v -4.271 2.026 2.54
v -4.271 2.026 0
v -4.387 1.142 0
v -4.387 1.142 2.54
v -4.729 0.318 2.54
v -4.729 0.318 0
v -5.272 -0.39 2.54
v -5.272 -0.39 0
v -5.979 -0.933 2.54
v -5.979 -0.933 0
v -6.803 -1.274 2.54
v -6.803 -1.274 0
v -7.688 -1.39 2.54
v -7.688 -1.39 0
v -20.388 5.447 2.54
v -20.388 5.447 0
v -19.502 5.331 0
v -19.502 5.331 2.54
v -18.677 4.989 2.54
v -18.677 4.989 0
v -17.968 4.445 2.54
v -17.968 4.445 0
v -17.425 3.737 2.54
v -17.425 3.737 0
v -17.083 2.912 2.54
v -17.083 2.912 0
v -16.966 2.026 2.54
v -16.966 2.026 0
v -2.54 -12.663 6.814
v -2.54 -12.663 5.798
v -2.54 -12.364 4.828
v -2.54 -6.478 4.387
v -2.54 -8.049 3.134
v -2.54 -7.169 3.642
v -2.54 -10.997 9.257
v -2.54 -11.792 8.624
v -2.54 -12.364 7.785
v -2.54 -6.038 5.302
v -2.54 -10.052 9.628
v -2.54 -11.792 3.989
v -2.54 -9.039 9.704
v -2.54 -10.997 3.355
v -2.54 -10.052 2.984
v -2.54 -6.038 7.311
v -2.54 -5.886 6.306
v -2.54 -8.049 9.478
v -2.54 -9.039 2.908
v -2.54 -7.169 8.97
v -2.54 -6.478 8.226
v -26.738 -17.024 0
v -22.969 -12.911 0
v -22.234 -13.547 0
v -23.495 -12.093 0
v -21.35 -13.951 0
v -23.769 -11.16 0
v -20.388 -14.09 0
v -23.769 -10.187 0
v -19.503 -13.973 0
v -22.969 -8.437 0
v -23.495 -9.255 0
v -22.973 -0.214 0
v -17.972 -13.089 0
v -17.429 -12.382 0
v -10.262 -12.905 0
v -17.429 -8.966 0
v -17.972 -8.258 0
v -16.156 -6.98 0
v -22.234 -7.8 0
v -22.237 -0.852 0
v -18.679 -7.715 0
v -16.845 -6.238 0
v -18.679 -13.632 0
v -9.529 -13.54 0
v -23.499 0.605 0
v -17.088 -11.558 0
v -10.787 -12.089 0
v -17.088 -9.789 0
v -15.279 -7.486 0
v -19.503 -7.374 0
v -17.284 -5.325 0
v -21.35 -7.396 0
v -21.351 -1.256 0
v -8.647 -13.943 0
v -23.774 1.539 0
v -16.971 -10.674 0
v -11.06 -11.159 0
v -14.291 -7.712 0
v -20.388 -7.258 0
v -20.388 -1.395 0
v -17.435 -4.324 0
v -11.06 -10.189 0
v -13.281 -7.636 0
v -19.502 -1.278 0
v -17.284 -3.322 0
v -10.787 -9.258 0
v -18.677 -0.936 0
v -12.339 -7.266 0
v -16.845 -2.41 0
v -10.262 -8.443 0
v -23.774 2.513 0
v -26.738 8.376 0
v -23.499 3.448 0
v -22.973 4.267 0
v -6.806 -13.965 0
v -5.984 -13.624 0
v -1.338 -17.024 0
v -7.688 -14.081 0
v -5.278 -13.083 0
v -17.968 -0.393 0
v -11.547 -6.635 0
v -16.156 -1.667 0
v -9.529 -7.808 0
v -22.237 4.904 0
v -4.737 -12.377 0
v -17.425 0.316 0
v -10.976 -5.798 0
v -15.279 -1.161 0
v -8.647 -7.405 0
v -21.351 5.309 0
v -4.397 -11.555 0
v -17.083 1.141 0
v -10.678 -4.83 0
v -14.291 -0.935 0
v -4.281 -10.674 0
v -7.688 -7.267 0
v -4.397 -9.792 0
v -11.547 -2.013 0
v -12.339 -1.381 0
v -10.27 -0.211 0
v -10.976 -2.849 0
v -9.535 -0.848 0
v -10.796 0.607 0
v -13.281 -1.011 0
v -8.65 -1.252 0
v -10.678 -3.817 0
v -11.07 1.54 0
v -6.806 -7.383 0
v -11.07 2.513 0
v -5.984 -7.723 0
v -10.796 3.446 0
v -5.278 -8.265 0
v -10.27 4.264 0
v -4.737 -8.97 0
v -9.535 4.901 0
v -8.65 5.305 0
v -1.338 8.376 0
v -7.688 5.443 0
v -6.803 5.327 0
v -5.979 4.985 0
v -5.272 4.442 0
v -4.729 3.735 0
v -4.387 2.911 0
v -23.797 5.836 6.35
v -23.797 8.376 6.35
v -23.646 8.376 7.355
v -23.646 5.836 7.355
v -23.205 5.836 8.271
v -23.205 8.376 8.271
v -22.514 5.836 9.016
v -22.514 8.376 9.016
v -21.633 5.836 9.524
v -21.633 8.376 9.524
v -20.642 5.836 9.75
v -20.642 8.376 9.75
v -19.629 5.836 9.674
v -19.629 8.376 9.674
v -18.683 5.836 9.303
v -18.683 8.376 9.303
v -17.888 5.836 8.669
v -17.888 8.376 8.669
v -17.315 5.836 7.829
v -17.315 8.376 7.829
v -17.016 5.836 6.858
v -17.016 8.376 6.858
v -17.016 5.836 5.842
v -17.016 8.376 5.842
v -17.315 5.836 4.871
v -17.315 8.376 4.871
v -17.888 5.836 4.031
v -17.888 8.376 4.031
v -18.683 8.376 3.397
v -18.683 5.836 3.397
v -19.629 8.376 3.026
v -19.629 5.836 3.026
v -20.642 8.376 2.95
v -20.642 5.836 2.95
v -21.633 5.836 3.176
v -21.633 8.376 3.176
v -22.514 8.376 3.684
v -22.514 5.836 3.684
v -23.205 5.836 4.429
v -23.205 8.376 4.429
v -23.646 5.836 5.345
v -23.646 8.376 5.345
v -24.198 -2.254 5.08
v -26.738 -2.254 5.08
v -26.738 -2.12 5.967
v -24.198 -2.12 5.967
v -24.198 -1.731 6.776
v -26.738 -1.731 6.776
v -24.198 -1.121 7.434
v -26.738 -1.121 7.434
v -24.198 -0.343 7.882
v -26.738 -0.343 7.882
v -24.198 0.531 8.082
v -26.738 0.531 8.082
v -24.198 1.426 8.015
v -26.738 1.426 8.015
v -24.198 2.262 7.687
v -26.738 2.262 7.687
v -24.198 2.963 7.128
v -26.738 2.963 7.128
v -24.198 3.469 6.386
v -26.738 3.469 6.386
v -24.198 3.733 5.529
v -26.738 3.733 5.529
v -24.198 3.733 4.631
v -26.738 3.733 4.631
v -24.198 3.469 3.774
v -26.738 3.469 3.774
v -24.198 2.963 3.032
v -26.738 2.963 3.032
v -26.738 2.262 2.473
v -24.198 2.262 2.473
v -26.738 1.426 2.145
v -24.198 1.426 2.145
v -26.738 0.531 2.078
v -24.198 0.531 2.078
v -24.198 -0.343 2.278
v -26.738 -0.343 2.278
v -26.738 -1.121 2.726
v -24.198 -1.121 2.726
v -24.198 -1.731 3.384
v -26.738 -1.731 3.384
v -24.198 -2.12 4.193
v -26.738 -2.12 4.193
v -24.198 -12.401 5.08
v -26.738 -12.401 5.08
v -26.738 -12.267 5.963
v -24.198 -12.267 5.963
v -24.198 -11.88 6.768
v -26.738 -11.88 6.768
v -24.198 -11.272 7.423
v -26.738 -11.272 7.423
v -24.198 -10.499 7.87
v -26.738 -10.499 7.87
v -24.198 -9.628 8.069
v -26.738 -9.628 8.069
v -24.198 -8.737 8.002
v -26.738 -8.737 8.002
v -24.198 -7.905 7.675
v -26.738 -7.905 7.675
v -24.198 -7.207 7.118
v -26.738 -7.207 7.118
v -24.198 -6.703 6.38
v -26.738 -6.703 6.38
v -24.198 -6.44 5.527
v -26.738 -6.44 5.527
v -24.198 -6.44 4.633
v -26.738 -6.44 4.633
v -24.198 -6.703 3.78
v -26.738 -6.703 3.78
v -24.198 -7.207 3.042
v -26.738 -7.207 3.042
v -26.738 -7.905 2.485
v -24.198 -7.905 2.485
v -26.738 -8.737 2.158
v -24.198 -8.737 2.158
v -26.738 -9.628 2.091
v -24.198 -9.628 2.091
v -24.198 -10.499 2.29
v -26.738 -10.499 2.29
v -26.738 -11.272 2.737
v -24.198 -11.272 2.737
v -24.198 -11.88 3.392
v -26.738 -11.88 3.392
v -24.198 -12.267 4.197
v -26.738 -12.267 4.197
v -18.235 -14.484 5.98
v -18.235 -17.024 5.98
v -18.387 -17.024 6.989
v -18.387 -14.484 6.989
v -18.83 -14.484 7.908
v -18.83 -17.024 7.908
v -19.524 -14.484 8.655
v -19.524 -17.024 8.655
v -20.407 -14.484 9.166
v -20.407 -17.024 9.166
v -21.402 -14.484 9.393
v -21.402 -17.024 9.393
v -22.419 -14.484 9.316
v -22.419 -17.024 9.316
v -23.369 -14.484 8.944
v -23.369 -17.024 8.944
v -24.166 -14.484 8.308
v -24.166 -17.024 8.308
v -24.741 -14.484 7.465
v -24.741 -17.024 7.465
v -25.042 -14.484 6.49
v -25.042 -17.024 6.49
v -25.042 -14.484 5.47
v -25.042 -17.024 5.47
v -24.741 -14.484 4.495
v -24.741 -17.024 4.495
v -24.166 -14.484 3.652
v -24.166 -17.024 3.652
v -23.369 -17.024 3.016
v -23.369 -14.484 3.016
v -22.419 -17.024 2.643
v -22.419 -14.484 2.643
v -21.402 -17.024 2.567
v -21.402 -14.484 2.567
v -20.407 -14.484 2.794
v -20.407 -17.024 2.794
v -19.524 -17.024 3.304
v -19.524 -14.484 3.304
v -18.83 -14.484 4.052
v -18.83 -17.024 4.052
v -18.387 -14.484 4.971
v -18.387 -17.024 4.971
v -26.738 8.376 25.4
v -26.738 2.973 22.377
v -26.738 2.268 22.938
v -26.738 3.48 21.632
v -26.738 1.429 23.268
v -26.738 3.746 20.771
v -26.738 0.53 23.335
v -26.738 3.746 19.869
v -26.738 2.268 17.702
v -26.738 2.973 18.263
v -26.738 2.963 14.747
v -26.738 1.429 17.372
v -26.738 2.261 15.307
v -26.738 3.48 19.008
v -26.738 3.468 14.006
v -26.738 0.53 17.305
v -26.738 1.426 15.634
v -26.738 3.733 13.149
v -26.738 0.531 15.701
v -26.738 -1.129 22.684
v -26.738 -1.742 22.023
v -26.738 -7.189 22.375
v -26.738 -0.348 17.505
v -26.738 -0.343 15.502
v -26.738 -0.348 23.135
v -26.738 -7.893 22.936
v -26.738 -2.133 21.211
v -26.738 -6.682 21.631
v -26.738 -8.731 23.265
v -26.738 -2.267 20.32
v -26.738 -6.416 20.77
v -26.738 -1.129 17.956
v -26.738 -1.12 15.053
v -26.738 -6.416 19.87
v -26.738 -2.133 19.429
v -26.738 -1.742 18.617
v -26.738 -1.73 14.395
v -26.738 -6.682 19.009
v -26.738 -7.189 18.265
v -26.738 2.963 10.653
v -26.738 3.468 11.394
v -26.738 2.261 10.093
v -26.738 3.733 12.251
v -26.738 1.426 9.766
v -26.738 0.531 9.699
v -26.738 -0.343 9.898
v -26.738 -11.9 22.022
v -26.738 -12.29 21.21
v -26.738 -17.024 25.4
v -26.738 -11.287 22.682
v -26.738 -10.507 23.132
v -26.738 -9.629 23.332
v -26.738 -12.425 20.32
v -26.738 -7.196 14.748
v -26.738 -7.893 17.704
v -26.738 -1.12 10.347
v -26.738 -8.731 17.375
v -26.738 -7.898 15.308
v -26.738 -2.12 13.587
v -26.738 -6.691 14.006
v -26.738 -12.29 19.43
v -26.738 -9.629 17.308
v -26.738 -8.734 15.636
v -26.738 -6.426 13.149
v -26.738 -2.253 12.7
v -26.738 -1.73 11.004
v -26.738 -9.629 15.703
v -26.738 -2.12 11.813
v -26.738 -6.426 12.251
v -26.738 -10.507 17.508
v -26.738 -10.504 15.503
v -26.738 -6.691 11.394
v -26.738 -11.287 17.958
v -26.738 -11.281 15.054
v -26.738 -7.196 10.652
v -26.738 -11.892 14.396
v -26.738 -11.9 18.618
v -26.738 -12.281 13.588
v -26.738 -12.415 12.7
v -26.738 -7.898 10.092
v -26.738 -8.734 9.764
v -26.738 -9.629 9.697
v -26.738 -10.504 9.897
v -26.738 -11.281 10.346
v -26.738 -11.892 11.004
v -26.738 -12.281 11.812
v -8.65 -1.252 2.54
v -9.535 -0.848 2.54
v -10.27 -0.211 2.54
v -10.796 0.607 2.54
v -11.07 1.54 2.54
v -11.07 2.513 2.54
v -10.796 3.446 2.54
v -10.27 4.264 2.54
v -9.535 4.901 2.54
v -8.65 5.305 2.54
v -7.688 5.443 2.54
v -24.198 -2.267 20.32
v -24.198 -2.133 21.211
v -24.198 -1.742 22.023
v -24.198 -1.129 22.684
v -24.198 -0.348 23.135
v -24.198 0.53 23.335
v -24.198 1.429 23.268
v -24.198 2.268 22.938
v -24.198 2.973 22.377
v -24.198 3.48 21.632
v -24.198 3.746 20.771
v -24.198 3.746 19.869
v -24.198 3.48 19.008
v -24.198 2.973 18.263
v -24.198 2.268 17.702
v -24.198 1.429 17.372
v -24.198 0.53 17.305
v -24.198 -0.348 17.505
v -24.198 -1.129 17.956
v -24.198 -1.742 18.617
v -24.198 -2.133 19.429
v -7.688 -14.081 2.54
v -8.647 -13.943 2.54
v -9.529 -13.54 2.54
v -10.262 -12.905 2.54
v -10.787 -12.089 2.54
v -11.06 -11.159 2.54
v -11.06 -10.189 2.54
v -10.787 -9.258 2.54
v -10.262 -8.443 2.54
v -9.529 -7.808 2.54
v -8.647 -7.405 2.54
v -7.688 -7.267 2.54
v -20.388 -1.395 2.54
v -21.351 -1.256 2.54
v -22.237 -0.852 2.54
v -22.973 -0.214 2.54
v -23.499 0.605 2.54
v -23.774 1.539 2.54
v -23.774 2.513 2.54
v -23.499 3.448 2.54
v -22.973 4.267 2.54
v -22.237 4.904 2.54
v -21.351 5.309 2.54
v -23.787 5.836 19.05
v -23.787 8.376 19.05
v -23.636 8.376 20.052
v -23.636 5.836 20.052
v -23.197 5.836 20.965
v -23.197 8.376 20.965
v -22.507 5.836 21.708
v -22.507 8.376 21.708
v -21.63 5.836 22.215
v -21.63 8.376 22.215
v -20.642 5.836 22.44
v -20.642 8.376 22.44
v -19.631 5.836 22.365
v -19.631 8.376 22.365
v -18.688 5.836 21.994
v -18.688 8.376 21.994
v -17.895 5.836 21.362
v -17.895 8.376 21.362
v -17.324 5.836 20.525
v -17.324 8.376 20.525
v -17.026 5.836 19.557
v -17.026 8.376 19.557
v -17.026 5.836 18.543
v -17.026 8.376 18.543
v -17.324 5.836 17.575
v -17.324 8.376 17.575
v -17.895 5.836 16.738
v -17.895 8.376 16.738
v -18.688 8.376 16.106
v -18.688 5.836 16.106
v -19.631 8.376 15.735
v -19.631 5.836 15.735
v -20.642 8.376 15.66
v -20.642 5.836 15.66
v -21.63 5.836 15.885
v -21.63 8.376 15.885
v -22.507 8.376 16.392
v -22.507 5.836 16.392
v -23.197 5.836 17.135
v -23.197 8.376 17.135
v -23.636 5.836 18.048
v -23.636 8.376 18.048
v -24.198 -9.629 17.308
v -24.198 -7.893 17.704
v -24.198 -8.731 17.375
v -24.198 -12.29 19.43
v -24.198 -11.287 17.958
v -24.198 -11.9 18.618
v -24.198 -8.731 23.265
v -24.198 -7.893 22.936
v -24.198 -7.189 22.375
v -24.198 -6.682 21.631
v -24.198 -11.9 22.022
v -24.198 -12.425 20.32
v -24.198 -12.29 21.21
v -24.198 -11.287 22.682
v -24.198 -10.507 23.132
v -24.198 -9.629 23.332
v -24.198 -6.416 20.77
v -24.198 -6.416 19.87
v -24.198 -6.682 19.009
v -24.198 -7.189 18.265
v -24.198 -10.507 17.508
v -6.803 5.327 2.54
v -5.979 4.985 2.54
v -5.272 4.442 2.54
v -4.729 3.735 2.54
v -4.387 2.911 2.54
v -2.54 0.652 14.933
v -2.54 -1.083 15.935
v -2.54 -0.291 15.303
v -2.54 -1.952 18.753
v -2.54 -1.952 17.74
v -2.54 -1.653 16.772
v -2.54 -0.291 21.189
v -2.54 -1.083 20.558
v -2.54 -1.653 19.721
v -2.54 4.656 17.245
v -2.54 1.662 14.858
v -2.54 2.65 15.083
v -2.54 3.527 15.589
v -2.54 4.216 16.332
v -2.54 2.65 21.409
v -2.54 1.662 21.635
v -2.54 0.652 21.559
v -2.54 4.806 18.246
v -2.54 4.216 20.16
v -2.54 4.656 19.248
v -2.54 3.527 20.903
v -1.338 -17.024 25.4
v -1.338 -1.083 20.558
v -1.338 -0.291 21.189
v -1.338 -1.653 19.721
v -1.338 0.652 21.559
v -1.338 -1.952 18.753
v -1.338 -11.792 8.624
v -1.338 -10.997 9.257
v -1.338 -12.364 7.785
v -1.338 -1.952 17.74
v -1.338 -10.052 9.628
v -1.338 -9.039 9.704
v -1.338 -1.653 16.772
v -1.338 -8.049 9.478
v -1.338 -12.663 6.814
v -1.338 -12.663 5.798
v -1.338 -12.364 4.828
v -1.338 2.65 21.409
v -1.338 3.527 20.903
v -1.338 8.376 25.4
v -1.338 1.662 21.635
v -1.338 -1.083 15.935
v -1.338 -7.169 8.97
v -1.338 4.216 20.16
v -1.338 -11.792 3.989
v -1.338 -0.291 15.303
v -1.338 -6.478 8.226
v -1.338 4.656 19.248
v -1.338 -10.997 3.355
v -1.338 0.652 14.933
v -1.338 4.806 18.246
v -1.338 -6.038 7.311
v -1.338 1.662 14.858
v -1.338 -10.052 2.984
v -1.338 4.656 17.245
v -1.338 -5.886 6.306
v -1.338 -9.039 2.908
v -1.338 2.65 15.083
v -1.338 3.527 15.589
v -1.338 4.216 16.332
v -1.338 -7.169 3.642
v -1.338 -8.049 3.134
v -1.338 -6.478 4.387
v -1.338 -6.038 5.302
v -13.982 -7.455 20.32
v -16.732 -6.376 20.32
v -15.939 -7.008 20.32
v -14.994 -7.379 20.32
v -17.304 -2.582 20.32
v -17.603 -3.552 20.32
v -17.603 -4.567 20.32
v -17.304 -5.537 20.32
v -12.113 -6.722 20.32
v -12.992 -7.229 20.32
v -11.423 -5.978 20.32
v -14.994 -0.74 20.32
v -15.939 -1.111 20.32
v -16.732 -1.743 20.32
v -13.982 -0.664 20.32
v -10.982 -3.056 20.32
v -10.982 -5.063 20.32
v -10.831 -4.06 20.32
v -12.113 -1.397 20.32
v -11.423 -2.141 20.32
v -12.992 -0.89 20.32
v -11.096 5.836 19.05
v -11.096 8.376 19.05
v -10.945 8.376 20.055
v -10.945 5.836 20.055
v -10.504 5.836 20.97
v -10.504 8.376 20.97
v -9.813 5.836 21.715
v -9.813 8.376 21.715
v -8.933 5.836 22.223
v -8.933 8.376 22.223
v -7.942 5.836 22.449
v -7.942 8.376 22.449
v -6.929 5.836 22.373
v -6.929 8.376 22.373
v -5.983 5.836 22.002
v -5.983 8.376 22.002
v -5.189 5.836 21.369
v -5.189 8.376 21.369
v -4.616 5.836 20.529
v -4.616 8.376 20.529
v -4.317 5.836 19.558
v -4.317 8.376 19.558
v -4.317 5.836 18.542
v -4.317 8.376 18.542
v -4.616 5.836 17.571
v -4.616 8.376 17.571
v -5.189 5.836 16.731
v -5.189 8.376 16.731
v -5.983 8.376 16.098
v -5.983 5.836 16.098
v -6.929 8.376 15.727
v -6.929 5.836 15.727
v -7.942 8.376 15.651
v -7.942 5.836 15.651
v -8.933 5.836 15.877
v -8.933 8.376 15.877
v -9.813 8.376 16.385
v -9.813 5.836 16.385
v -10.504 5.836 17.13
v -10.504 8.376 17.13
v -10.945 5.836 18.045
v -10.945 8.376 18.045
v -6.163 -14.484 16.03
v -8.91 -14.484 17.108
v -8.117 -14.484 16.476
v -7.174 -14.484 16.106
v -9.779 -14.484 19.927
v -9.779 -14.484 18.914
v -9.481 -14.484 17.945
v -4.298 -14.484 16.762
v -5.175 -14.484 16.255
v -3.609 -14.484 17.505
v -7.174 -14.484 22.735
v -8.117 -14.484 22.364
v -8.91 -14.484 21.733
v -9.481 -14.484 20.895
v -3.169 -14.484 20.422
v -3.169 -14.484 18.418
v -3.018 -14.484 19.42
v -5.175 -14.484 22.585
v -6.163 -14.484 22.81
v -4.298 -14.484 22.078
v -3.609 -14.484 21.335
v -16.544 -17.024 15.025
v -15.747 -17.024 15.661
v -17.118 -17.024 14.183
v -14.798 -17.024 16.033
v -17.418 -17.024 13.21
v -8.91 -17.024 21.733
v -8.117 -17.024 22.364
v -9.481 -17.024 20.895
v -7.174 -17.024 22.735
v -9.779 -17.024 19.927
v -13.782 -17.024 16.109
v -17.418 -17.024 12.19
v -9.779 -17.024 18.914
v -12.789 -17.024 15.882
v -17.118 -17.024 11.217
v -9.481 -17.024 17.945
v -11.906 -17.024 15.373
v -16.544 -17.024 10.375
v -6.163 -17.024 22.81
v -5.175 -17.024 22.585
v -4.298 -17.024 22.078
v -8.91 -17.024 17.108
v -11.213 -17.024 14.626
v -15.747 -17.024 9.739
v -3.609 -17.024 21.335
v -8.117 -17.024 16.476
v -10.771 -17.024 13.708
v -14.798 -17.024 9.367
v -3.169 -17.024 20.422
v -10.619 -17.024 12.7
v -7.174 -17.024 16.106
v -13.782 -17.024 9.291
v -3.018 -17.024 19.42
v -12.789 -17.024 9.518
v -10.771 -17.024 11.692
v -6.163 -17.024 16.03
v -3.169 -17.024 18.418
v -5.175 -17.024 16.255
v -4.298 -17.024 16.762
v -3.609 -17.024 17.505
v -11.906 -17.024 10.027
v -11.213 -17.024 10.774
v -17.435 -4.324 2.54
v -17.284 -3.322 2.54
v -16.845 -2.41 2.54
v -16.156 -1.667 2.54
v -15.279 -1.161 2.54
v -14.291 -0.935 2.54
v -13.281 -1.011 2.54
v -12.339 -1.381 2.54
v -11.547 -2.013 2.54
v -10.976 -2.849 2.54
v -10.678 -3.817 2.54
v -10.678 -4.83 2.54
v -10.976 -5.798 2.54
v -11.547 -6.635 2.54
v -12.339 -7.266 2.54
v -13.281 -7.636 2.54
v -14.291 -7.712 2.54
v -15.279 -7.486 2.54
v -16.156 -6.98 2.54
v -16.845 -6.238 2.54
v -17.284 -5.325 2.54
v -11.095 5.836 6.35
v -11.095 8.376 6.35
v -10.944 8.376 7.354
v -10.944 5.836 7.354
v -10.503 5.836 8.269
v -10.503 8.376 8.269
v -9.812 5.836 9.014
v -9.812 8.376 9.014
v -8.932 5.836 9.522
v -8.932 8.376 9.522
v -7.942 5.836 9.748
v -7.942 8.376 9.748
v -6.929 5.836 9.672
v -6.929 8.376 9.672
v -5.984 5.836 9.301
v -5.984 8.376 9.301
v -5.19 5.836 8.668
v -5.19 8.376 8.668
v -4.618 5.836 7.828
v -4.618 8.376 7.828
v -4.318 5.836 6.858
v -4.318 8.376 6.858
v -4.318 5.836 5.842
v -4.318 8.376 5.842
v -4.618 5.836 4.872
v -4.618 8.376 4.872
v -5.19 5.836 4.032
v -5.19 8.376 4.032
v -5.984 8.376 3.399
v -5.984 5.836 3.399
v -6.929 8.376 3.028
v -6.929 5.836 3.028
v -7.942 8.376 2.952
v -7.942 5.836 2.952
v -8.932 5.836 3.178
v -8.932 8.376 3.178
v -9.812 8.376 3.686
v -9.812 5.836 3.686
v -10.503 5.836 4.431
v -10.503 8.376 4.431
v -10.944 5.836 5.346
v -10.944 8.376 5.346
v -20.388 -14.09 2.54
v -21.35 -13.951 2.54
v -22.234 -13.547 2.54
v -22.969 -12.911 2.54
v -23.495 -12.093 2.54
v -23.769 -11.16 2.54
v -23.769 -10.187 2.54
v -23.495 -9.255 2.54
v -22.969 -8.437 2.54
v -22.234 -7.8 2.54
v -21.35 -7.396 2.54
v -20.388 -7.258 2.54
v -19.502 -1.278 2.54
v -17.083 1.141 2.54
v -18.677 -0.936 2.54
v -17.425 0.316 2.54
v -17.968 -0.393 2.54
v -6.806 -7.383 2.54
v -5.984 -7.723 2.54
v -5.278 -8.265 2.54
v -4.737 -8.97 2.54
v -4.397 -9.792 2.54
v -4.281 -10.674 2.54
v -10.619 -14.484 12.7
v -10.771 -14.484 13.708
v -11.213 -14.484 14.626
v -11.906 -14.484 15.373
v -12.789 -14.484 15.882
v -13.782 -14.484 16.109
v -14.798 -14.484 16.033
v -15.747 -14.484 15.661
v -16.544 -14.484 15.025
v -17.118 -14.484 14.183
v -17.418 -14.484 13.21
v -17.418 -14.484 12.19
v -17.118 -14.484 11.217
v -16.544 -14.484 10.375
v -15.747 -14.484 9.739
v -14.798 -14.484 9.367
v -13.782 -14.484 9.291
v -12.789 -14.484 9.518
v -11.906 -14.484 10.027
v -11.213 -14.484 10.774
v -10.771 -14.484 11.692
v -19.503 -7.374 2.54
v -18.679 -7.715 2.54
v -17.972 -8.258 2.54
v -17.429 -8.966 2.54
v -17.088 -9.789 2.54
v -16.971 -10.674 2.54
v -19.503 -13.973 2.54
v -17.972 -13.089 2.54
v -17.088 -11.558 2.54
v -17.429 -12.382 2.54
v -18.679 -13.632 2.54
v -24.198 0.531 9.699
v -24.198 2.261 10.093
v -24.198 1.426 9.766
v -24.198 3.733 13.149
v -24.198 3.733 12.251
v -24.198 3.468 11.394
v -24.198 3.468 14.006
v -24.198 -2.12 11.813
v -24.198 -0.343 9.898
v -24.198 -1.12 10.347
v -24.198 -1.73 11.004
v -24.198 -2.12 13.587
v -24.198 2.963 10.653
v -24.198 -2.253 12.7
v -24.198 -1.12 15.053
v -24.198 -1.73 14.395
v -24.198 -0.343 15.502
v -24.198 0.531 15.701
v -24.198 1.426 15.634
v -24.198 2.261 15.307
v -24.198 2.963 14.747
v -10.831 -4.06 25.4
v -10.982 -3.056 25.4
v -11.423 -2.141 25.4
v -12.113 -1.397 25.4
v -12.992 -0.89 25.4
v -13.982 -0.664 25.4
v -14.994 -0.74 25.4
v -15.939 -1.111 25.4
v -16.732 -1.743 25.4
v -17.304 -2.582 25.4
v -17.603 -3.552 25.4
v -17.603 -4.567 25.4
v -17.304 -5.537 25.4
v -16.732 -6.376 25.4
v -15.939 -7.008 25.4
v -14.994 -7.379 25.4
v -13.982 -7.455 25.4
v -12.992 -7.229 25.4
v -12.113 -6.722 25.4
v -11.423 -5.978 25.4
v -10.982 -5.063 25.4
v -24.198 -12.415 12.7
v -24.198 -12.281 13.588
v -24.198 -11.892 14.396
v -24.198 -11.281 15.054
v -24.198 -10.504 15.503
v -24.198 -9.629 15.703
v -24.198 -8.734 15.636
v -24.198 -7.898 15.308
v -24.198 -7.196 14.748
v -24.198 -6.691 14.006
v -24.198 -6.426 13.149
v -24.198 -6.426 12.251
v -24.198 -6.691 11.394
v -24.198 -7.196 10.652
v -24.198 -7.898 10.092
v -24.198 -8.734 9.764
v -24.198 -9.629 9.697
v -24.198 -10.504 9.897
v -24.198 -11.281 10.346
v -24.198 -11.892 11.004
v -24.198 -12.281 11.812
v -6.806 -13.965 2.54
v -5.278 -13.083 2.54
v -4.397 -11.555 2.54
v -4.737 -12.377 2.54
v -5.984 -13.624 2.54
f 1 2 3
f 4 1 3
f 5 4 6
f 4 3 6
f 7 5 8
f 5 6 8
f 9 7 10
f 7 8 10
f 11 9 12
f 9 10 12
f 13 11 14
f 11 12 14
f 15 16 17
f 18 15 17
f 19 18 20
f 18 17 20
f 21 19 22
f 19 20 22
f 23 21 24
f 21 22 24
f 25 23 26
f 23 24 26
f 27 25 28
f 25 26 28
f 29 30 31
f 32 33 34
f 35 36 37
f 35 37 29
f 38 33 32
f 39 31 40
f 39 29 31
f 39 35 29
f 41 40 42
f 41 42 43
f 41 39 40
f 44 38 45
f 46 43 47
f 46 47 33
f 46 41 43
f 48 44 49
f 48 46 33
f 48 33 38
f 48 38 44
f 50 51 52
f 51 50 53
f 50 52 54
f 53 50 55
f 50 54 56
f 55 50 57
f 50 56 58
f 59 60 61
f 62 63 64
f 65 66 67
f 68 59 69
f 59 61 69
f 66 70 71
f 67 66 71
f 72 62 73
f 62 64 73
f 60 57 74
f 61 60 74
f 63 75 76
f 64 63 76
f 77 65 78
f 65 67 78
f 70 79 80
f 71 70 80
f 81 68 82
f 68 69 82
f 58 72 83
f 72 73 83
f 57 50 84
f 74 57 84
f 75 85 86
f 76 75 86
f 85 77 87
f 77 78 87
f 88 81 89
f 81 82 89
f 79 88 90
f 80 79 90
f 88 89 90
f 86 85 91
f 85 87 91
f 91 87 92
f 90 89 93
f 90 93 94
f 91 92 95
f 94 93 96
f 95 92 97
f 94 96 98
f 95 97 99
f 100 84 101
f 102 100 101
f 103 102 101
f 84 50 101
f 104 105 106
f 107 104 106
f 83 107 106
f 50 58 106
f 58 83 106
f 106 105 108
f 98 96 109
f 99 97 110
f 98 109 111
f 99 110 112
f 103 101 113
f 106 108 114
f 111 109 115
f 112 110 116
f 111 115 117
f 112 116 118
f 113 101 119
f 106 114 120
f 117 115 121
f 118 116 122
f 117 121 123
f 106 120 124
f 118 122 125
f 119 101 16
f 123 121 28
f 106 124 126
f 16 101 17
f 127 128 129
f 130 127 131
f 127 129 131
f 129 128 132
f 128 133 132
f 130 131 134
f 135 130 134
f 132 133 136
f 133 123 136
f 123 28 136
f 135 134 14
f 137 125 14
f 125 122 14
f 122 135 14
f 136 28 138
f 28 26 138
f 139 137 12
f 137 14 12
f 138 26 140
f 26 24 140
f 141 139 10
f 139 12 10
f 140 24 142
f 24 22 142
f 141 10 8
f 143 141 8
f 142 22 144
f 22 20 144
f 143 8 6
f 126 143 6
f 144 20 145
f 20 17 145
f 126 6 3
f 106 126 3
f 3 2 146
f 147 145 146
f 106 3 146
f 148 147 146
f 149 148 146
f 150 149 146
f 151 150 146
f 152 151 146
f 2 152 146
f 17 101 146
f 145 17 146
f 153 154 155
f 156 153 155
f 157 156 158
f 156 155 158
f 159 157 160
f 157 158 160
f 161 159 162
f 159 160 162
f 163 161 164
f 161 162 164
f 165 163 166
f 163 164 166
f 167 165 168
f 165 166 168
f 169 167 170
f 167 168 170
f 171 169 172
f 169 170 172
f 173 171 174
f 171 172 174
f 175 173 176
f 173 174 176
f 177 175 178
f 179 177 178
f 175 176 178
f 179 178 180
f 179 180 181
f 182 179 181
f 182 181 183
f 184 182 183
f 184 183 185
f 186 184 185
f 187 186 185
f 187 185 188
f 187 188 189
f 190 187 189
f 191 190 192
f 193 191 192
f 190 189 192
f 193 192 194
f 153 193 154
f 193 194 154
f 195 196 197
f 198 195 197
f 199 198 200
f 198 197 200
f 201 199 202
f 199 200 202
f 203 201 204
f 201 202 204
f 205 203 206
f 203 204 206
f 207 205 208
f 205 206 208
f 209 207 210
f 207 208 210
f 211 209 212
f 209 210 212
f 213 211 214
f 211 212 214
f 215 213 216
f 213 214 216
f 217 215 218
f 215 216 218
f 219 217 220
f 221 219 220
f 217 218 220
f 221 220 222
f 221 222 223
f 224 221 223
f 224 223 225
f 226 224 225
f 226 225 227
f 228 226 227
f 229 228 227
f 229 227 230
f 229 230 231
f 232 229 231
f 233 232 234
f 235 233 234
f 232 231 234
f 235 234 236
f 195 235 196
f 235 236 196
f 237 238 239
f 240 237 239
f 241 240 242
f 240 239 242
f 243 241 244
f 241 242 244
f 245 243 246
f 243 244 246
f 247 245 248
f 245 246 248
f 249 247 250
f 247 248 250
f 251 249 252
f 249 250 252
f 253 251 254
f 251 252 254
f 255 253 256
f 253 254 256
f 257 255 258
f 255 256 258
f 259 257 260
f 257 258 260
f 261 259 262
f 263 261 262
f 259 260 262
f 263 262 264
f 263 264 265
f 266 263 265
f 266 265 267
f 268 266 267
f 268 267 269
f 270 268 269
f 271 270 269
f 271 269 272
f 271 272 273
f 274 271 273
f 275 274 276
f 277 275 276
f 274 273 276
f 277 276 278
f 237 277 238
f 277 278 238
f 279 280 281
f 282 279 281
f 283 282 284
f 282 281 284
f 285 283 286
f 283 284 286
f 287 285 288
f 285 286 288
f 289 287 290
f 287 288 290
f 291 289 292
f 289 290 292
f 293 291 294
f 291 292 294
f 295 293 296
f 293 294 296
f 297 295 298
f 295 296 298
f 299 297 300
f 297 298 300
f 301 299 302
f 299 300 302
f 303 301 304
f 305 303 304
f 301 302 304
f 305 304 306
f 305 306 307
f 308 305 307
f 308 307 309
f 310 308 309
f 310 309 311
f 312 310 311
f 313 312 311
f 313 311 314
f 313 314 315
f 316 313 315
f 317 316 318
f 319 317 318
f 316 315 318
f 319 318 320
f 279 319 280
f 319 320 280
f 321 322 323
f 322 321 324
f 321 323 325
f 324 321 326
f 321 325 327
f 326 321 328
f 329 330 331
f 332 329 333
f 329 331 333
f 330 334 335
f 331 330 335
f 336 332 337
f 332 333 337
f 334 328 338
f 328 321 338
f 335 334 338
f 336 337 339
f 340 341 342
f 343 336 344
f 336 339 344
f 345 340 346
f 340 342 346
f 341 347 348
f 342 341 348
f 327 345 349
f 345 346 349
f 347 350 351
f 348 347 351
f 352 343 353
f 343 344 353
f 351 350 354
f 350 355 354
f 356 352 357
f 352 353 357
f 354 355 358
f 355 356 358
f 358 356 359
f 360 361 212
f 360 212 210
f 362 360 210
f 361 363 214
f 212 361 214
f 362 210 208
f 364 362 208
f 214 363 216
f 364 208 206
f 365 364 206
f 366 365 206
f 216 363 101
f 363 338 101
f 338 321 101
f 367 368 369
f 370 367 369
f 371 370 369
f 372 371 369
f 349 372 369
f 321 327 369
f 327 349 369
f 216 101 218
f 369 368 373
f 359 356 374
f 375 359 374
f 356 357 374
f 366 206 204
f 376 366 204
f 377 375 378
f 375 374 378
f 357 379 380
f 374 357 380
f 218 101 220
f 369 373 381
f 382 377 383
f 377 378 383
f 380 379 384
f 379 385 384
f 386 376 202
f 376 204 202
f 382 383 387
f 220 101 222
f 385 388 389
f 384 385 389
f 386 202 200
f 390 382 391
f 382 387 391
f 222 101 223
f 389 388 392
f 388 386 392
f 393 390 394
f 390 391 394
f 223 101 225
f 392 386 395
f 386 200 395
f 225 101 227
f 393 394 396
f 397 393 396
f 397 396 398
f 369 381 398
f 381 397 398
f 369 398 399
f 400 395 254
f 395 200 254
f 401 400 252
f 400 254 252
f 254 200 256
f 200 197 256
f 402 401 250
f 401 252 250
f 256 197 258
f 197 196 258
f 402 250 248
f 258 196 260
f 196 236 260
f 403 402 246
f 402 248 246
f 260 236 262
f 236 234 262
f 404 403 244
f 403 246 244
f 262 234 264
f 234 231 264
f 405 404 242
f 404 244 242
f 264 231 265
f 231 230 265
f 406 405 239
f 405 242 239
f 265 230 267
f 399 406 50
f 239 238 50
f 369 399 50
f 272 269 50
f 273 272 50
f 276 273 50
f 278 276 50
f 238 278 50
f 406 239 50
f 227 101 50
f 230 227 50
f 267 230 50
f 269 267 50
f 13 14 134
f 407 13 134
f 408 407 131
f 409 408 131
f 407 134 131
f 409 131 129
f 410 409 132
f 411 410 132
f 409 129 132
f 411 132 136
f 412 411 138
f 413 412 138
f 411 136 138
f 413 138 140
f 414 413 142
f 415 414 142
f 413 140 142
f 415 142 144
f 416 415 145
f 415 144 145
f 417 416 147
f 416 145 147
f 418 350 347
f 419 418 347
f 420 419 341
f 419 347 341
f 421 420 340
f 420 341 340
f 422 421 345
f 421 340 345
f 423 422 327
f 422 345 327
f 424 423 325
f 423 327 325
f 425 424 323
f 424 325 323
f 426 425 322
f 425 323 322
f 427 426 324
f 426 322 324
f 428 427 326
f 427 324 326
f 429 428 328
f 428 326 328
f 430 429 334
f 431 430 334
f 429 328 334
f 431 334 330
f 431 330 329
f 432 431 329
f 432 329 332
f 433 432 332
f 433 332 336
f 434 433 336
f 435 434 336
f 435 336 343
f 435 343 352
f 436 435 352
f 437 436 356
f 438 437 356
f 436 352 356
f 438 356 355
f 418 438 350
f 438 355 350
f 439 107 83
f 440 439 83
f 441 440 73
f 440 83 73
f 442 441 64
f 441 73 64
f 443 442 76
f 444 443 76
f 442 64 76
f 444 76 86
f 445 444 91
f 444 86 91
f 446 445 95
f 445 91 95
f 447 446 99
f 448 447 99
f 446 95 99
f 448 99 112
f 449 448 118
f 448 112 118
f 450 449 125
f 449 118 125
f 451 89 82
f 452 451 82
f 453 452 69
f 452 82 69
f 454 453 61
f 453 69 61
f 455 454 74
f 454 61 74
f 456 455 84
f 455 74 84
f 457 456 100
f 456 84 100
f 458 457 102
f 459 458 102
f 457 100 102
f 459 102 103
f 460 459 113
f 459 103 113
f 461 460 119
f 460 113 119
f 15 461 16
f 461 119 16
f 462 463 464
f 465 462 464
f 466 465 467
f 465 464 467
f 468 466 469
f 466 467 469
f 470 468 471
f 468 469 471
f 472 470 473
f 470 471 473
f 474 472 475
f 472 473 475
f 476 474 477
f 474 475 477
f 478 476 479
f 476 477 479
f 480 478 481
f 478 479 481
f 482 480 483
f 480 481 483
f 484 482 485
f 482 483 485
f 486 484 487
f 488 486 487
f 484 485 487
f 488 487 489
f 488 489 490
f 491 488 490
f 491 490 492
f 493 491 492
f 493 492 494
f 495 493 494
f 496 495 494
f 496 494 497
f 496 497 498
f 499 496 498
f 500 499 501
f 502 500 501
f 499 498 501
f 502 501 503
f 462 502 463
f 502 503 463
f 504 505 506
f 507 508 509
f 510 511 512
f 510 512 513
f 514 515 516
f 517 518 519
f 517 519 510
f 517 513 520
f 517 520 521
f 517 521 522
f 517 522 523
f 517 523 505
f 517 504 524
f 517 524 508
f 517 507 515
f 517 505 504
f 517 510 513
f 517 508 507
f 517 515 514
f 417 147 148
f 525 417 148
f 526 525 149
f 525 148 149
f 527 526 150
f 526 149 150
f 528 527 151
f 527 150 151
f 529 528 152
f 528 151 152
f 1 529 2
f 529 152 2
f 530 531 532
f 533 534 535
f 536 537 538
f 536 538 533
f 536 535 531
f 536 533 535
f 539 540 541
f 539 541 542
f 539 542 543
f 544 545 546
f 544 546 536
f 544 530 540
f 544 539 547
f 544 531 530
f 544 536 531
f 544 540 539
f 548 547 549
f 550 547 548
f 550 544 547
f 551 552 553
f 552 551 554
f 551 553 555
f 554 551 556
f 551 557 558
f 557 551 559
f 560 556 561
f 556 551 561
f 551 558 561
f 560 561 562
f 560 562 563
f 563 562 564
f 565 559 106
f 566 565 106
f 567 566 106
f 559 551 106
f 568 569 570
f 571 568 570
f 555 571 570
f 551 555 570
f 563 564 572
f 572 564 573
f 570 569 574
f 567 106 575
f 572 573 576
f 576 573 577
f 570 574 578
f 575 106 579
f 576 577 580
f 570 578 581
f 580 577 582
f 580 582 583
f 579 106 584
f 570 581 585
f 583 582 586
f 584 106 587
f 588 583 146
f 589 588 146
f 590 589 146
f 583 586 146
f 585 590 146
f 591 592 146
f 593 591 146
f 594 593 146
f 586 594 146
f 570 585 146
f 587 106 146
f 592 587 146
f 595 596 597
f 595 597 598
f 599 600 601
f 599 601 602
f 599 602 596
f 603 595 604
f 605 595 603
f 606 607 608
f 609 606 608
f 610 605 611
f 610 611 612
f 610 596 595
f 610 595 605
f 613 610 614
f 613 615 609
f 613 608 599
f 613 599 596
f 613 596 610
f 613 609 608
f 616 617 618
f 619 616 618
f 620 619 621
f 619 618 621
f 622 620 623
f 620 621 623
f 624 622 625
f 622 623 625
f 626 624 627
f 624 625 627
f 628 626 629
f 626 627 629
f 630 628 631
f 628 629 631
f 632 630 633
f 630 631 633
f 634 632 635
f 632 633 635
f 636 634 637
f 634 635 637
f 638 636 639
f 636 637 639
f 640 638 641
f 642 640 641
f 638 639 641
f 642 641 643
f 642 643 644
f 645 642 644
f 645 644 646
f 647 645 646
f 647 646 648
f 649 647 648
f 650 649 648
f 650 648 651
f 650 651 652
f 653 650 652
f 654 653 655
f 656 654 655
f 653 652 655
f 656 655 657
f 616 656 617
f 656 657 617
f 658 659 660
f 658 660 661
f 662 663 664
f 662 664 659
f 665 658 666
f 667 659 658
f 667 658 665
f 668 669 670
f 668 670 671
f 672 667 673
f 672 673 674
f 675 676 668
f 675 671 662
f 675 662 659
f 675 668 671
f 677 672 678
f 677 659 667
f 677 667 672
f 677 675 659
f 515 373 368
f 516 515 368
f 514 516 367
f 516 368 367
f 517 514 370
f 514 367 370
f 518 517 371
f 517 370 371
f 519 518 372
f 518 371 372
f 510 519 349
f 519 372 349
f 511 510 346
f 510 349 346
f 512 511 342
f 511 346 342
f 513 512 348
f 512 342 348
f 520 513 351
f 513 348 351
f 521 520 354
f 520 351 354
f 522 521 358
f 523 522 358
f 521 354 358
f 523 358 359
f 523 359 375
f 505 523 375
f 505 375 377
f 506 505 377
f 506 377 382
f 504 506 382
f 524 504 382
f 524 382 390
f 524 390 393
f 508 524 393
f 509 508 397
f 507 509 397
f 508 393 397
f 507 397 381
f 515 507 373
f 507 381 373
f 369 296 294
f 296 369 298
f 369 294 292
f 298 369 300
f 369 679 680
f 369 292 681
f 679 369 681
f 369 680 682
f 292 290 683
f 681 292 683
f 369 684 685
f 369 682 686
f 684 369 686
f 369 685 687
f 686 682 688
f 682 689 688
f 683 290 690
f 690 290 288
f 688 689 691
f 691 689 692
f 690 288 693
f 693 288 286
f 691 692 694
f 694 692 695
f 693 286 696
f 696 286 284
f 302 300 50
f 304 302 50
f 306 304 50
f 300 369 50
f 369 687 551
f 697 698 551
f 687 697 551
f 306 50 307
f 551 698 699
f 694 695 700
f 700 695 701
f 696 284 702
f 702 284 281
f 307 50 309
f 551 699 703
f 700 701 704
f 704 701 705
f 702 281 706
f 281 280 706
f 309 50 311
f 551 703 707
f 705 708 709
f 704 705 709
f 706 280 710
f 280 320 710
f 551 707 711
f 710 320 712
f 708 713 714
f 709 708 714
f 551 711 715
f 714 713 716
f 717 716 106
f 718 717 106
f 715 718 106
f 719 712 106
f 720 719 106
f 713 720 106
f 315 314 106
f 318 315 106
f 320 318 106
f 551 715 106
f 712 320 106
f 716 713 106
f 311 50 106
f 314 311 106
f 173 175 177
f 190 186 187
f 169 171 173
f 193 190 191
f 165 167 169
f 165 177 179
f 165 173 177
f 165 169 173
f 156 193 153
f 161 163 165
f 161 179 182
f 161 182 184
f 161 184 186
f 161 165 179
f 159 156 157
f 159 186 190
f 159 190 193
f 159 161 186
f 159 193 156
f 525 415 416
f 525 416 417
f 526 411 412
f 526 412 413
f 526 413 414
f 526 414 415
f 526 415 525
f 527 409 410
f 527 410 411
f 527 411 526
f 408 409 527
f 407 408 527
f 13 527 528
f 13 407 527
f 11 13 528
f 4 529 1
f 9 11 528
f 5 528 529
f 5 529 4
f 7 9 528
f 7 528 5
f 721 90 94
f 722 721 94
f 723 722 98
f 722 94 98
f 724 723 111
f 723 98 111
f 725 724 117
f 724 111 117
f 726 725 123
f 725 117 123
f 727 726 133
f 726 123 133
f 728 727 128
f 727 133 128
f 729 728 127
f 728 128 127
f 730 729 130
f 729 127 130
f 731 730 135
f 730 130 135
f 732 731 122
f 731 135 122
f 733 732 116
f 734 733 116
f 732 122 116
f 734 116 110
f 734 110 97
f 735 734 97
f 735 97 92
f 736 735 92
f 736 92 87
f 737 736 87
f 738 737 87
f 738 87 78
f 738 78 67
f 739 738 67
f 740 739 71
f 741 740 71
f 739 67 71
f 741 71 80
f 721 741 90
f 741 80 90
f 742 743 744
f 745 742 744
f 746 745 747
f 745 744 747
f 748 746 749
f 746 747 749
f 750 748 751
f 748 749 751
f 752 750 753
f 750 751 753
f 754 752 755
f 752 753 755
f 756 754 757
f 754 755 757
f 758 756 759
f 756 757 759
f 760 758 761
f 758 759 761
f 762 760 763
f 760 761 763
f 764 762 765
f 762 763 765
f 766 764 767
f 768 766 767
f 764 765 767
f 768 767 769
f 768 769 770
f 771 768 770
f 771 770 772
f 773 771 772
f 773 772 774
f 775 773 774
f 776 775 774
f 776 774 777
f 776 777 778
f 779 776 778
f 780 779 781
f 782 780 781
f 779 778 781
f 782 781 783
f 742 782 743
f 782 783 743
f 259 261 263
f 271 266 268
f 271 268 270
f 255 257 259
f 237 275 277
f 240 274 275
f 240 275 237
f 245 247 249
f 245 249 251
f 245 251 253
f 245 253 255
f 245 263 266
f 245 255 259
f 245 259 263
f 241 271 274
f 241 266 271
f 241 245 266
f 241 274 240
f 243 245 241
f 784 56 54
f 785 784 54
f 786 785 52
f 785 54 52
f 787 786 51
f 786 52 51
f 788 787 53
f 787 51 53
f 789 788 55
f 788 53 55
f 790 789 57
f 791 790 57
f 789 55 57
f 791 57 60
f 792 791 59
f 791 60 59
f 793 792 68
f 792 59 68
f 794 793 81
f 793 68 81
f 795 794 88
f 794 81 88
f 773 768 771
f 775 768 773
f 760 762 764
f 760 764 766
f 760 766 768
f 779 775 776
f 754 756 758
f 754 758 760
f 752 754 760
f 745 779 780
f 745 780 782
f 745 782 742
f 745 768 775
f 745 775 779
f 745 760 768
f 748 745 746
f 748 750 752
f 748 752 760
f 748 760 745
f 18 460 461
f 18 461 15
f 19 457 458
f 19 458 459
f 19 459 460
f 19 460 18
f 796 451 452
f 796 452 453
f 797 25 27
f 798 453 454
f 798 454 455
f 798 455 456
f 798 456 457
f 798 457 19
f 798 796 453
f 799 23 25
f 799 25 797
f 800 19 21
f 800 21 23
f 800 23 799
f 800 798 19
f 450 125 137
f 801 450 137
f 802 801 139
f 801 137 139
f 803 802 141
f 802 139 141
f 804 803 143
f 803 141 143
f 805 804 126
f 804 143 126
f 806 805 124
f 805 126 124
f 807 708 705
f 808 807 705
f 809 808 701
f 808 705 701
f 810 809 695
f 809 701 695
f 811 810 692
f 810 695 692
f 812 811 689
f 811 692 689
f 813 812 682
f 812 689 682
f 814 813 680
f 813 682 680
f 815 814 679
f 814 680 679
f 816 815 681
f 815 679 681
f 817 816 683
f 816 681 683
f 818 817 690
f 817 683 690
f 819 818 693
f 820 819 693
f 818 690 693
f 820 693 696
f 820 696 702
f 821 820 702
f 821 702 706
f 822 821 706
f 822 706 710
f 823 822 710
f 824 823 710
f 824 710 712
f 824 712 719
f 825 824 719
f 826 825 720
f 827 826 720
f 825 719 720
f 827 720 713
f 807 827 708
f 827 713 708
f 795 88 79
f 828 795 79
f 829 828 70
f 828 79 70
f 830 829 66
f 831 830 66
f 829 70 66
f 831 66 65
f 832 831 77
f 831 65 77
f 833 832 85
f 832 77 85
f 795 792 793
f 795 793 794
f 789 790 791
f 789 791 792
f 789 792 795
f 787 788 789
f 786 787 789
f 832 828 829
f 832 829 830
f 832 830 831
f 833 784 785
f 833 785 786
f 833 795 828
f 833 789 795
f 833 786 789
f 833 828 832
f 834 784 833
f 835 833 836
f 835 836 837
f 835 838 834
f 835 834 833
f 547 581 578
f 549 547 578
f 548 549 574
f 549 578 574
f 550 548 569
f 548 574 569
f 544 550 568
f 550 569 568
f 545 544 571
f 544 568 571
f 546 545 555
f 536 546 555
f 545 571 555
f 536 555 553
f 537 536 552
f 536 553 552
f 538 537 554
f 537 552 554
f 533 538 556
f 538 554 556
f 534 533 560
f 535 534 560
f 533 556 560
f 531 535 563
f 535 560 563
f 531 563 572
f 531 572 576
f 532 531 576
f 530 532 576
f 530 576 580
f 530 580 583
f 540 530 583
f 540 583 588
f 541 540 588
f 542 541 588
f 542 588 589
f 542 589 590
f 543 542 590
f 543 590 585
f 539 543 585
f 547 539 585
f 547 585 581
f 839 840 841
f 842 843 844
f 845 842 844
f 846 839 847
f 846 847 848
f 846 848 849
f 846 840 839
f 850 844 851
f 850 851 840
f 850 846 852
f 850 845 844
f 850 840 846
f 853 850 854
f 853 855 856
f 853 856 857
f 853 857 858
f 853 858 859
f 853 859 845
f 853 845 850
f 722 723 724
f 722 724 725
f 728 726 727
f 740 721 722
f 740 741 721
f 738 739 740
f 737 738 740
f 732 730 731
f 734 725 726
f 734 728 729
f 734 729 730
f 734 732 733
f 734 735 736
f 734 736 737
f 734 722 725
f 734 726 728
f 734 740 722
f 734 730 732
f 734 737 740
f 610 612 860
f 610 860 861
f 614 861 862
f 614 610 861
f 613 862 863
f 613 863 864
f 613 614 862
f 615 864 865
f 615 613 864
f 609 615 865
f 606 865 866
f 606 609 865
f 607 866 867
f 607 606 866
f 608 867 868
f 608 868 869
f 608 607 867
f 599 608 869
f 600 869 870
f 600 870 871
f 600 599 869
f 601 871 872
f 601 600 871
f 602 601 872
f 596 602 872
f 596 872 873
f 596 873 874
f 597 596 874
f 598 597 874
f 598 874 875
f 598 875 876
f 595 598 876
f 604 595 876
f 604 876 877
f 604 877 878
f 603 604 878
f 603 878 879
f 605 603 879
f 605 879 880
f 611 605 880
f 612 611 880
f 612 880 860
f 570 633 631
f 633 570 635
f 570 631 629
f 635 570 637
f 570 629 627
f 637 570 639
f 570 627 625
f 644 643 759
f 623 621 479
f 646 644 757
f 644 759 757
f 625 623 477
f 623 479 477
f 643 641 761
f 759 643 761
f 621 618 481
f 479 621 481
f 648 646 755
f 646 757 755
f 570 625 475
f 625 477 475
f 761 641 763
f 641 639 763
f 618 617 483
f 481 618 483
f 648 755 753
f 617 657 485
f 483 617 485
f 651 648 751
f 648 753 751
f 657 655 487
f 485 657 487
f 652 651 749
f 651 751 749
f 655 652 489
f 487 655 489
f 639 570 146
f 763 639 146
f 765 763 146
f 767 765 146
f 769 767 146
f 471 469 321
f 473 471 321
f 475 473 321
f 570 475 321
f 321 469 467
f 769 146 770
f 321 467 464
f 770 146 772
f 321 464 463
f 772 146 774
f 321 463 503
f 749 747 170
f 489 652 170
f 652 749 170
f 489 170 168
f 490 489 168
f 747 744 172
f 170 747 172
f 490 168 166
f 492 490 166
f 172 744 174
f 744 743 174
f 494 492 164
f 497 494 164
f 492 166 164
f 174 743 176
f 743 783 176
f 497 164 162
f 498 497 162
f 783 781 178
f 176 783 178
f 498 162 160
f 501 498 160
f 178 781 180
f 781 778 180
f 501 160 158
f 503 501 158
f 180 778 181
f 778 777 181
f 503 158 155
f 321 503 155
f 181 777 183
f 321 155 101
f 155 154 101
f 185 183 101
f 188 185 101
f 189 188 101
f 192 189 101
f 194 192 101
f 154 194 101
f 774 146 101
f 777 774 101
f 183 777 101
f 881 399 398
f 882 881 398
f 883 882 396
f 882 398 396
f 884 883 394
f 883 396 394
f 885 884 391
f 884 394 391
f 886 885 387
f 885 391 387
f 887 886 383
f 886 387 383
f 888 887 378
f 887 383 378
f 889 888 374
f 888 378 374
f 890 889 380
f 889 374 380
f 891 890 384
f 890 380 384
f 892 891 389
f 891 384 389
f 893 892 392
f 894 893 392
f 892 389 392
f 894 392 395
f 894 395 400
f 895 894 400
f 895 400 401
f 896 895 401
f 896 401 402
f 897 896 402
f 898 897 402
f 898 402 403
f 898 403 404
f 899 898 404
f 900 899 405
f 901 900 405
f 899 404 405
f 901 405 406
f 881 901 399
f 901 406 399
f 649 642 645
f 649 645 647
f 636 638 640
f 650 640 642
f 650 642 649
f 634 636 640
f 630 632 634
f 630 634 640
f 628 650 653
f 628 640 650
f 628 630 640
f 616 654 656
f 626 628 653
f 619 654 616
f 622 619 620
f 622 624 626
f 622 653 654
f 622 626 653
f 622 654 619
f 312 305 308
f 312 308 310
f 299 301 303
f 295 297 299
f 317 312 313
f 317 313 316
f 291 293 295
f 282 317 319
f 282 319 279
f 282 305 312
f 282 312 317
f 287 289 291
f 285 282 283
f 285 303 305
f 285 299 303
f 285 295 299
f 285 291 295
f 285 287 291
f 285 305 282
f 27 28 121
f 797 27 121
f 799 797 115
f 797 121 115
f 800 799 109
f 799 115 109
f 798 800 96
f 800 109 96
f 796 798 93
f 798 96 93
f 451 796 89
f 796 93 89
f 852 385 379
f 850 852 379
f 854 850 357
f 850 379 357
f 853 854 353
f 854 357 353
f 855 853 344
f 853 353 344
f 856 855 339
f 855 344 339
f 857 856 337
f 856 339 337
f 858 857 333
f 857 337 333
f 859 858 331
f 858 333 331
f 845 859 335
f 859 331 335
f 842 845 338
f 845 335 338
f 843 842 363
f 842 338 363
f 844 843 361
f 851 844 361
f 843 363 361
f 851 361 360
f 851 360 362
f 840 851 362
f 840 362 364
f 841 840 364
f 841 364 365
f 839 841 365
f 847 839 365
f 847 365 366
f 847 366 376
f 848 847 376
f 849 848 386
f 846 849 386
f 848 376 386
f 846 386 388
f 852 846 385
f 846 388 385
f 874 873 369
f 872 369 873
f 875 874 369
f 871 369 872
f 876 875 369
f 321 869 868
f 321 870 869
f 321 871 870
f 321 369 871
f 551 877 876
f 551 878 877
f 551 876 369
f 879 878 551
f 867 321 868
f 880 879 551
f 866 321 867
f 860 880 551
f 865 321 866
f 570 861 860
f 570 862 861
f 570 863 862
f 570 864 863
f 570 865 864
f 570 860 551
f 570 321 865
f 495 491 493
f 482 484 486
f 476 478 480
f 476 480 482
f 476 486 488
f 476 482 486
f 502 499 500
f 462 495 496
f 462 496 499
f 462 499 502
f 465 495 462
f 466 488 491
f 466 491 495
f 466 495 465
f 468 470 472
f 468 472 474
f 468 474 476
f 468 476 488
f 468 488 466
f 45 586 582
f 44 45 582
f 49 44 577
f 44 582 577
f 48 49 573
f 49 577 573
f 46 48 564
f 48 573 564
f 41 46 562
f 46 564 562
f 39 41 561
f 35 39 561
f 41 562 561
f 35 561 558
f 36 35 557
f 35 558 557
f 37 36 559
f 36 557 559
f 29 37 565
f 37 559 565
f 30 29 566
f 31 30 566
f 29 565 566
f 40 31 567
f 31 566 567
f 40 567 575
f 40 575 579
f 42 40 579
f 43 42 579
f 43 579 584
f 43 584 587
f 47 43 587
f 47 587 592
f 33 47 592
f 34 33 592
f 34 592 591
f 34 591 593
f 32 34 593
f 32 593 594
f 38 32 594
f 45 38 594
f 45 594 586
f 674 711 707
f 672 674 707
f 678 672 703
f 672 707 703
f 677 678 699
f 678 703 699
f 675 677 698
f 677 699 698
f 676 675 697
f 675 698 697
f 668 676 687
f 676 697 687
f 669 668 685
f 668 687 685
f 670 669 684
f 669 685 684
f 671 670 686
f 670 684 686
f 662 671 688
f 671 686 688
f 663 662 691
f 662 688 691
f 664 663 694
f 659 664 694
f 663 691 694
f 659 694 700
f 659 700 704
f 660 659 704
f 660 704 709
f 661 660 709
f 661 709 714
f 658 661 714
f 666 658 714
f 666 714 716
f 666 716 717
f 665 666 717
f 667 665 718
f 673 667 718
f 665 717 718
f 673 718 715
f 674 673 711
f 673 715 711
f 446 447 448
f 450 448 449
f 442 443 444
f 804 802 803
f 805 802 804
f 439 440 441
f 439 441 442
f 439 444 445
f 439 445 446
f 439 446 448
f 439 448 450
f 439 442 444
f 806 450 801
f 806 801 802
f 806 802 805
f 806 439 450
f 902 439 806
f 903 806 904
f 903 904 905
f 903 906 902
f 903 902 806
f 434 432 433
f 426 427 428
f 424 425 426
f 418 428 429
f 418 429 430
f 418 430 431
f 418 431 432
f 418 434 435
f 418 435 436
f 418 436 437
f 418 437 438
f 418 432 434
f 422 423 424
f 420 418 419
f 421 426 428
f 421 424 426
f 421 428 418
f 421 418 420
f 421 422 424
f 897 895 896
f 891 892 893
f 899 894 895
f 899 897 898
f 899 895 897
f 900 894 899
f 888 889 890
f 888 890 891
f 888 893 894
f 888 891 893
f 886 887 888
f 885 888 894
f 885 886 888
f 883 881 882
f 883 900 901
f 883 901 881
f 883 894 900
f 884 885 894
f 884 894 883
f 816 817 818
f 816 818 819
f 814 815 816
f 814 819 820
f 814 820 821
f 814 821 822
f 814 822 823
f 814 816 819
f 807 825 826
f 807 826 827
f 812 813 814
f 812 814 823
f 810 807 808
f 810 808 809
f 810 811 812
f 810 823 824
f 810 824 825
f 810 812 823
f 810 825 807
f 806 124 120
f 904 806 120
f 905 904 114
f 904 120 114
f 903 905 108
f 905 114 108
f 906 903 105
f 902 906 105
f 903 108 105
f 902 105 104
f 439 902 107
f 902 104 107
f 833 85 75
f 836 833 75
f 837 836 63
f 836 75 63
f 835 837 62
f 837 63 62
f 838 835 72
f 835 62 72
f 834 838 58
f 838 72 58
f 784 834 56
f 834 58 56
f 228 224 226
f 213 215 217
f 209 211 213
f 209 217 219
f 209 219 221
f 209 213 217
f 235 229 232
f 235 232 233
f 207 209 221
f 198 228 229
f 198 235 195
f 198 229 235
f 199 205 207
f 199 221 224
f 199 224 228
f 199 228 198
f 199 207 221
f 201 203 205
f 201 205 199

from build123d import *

# Parameters (mm, degrees)
F0_R      = 3.405104
F1_DEPTH  = 25.4
F3_DEPTH  = 20.32
F4_R      = 3.422318
F4_R_2    = 3.418745
F4_R_3    = 3.399739
F5_DEPTH  = 2.54
F6_R      = 3.408954
F6_R_2    = 3.409845
F6_R_3    = 3.399812
F6_R_4    = 3.407384
F7_DEPTH  = 2.54
F9_DEPTH  = 2.54
F10_R     = 3.020938
F10_R_2   = 3.01106
F10_R_3   = 3.009838
F10_R_4   = 3.023548
F10_R_5   = 3.010431
F10_R_6   = 2.996939
F11_DEPTH = 2.54
F2_R      = 3.407459
F2_R_2    = 3.398087
F12_DEPTH = 2.54


with BuildPart() as f1:
    # F0 (on Top) → F1 (new body)
    with BuildSketch(Plane.XY):
        Polygon((-5.147523, 8.376352), (-22.927523, 8.376352), (-26.737523, 8.376352), (-26.737523, 4.566352), (-26.737523, -13.213648), (-26.737523, -17.023648), (-22.927523, -17.023648), (-5.147523, -17.023648), (-1.337523, -17.023648), (-1.337523, -13.213648), (-1.337523, 4.566352), (-1.337523, 8.376352), align=None)
        with Locations((-14.236085, -4.059524)):
            Circle(F0_R, mode=Mode.SUBTRACT)
    extrude(amount=F1_DEPTH)

    # F0 (on Top) → F3 (join)
    with BuildSketch(Plane.XY):
        with Locations((-14.236085, -4.059524)):
            Circle(F0_R)
    extrude(amount=F3_DEPTH)

    # F4 (on face) → F5 (cut)
    with BuildSketch(Plane.XZ.offset(17.023648)):
        with Locations((-21.657523, 5.979792)):
            Circle(F4_R)
        with Locations((-14.037523, 12.7)):
            Circle(F4_R_2)
        with Locations((-6.417523, 19.420208)):
            Circle(F4_R_3)
    extrude(amount=-F5_DEPTH, mode=Mode.SUBTRACT)

    # F6 (on face) → F7 (cut)
    with BuildSketch(Plane(origin=(0, 8.376352, 0), x_dir=(-1, 0, 0), z_dir=(0, 1, 0))):
        with Locations((7.687523, 19.05)):
            Circle(F6_R)
        with Locations((20.387523, 6.35)):
            Circle(F6_R_2)
        with Locations((20.387523, 19.05)):
            Circle(F6_R_3)
        with Locations((7.687523, 6.35)):
            Circle(F6_R_4)
    extrude(amount=-F7_DEPTH, mode=Mode.SUBTRACT)

    # F8 (on face) → F9 (cut)
    with BuildSketch(Plane(origin=(0, 0, 0), x_dir=(1, 0, 0), z_dir=(0, 0, -1))):
        with BuildLine():
            Line((-14.037523, 4.323648), (-10.639824, 4.323648))
            ThreePointArc((-10.639824, 4.323648), (-14.037523, 7.721346), (-17.435221, 4.323648))
            Line((-17.435221, 4.323648), (-14.037523, 4.323648))
        make_face()
        with BuildLine():
            ThreePointArc((-16.966481, -2.026352), (-17.968481, 0.392689), (-20.387523, 1.394689))
            Line((-20.387523, 1.394689), (-20.387523, -5.447394))
            ThreePointArc((-20.387523, -5.447394), (-17.968481, -4.445394), (-16.966481, -2.026352))
        make_face()
        with BuildLine():
            Line((-20.387523, -5.447394), (-20.387523, 1.394689))
            ThreePointArc((-20.387523, 1.394689), (-23.808564, -2.026352), (-20.387523, -5.447394))
        make_face()
        with BuildLine():
            ThreePointArc((-20.387523, 14.08974), (-23.803615, 10.673648), (-20.387523, 7.257555))
            Line((-20.387523, 7.257555), (-20.387523, 14.08974))
        make_face()
        with BuildLine():
            Line((-20.387523, 14.08974), (-20.387523, 7.257555))
            ThreePointArc((-20.387523, 7.257555), (-17.97198, 8.258105), (-16.97143, 10.673648))
            ThreePointArc((-16.97143, 10.673648), (-17.97198, 13.08919), (-20.387523, 14.08974))
        make_face()
        with BuildLine():
            ThreePointArc((-17.435221, 4.323648), (-14.037523, 0.925949), (-10.639824, 4.323648))
            Line((-10.639824, 4.323648), (-14.037523, 4.323648))
            Line((-14.037523, 4.323648), (-17.435221, 4.323648))
        make_face()
        with BuildLine():
            ThreePointArc((-7.687523, 14.080634), (-11.094509, 10.673648), (-7.687523, 7.266661))
            Line((-7.687523, 7.266661), (-7.687523, 14.080634))
        make_face()
        with BuildLine():
            Line((-7.687523, 14.080634), (-7.687523, 7.266661))
            ThreePointArc((-7.687523, 7.266661), (-5.278419, 8.264544), (-4.280536, 10.673648))
            ThreePointArc((-4.280536, 10.673648), (-5.278419, 13.082751), (-7.687523, 14.080634))
        make_face()
        with BuildLine():
            ThreePointArc((-4.270767, -2.026352), (-5.271512, 0.389659), (-7.687523, 1.390403))
            Line((-7.687523, 1.390403), (-7.687523, -5.443108))
            ThreePointArc((-7.687523, -5.443108), (-5.271512, -4.442363), (-4.270767, -2.026352))
        make_face()
        with BuildLine():
            Line((-7.687523, -5.443108), (-7.687523, 1.390403))
            ThreePointArc((-7.687523, 1.390403), (-11.104278, -2.026352), (-7.687523, -5.443108))
        make_face()
    extrude(amount=-F9_DEPTH, mode=Mode.SUBTRACT)

    # F10 (on face) → F11 (cut)
    with BuildSketch(Plane(origin=(-26.737523, 0, 0), x_dir=(0, -1, 0), z_dir=(-1, 0, 0))):
        with Locations((9.403648, 20.32)):
            Circle(F10_R)
        with Locations((9.403648, 12.7)):
            Circle(F10_R_2)
        with Locations((-0.756352, 12.699992)):
            Circle(F10_R_3)
        with Locations((-0.756352, 20.32)):
            Circle(F10_R_4)
        with Locations((-0.756352, 5.08)):
            Circle(F10_R_5)
        with Locations((9.403648, 5.08)):
            Circle(F10_R_6)
    extrude(amount=-F11_DEPTH, mode=Mode.SUBTRACT)

    # F2 (on Right) → F12 (cut)
    with BuildSketch(Plane.YZ):
        with Locations((-9.293744, 6.306227)):
            Circle(F2_R)
        with Locations((1.408402, 18.246217)):
            Circle(F2_R_2)
    extrude(amount=-F12_DEPTH, mode=Mode.SUBTRACT)


solid = f1.part
